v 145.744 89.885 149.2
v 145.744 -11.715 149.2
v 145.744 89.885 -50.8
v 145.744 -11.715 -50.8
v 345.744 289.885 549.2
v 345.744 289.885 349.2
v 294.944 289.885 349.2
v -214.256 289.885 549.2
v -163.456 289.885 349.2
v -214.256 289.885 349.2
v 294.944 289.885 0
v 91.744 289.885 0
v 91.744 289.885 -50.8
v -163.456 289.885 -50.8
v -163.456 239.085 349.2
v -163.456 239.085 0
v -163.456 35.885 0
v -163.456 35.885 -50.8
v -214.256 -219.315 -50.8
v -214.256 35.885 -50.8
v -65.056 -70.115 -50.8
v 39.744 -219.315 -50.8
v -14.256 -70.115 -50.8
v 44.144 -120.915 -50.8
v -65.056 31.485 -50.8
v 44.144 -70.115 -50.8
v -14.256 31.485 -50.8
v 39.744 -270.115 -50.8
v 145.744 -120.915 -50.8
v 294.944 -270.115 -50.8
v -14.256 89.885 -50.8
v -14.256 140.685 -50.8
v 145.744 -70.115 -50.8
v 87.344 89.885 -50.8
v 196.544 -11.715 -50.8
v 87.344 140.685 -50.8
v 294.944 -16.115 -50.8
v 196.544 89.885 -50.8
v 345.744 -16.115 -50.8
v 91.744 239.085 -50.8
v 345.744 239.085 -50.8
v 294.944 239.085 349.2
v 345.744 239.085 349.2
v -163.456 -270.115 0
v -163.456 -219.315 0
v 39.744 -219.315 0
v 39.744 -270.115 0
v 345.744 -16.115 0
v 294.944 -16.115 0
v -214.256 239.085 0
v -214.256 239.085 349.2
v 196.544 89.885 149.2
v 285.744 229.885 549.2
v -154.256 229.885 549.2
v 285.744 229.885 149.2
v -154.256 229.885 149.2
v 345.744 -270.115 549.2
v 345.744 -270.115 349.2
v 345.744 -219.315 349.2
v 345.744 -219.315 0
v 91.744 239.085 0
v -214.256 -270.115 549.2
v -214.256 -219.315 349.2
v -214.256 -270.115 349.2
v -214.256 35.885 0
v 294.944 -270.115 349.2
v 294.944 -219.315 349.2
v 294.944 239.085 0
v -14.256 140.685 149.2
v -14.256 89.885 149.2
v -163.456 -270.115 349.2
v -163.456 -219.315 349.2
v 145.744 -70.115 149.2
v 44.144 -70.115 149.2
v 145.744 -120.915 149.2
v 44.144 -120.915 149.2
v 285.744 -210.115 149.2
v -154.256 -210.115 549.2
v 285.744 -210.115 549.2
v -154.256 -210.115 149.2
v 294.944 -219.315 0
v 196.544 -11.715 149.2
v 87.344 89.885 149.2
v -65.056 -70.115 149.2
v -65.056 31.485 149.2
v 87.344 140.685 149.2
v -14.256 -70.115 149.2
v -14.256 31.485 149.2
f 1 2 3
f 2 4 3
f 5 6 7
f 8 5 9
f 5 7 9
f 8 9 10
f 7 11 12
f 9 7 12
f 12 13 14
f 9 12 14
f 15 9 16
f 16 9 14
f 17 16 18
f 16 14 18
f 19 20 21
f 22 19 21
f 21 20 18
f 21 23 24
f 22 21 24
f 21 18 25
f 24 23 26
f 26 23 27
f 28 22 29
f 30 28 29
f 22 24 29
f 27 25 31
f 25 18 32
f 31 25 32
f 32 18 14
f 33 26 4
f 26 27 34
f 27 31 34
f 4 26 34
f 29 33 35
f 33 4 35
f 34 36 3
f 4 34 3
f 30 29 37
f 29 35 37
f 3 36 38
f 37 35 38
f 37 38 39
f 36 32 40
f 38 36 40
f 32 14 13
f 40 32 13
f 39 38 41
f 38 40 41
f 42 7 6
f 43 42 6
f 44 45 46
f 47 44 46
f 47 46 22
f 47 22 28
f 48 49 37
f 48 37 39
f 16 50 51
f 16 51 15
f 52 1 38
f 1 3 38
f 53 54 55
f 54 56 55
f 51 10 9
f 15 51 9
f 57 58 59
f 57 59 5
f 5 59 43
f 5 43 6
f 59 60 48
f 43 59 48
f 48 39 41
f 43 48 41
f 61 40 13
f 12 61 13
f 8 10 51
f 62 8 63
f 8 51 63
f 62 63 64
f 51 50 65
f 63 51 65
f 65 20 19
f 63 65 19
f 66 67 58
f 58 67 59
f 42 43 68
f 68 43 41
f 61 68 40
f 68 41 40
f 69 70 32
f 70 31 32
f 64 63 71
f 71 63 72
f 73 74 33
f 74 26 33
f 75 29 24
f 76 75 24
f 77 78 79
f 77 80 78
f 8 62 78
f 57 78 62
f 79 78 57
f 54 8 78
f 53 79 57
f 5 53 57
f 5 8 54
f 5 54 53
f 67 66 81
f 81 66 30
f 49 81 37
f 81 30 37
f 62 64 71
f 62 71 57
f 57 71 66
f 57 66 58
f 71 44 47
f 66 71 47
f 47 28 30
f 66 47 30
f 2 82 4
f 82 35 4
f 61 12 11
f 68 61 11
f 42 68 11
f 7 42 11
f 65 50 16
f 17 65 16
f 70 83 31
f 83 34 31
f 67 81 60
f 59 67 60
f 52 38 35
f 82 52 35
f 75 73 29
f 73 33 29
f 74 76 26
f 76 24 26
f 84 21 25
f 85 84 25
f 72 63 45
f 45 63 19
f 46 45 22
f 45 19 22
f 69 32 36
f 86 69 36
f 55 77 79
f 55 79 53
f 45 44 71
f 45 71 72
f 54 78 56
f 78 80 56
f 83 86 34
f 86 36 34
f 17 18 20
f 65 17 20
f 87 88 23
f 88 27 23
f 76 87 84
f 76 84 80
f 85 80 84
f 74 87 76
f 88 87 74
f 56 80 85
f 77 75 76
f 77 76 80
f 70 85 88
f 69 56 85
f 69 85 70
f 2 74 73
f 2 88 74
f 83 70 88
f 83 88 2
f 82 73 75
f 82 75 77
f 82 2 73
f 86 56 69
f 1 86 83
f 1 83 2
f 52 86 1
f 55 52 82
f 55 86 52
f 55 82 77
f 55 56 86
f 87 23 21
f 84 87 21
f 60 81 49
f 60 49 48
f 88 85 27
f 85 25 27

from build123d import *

# Parameters (mm, degrees)
F0_W     = 440
F0_H     = 440
F1_DEPTH = 50.8
F0_W_2   = 50.8
F0_H_2   = 203.2
F0_W_3   = 203.2
F0_H_3   = 50.8
F2_DEPTH = 349.2
F3_DEPTH = 149.2
F4_W     = 440
F4_H     = 440
F4_W_2   = 50.8
F4_H_2   = 50.8
F5_DEPTH = 200


# Not quite as in the source:
# - a feature names something its author has since deleted; it is built from what else it names


with BuildPart() as f1:
    # F0 (on Top) → F1 (new body)
    with BuildSketch(Plane.XY):
        Polygon((91.7435496044, 289.8852448295), (-163.4564503956, 289.8852448295), (-163.4564503956, 239.0852448295), (-163.4564503956, 35.8852448295), (-214.2564503956, 35.8852448295), (-214.2564503956, -219.3147551705), (-163.4564503956, -219.3147551705), (39.7435496044, -219.3147551705), (39.7435496044, -270.1147551705), (294.9435496044, -270.1147551705), (294.9435496044, -219.3147551705), (294.9435496044, -16.1147551705), (345.7435496044, -16.1147551705), (345.7435496044, 239.0852448295), (294.9435496044, 239.0852448295), (91.7435496044, 239.0852448295), align=None)
        with Locations((65.7435496044, 9.8852448295)):
            Rectangle(F0_W, F0_H, mode=Mode.SUBTRACT)
        with Locations((65.7435496044, 9.8852448295)):
            Rectangle(F0_W, F0_H)
        Polygon((-65.0564503956, 140.6852448295), (-14.2564503956, 140.6852448295), (87.3435496044, 140.6852448295), (196.5435496044, 140.6852448295), (196.5435496044, 89.8852448295), (196.5435496044, -11.7147551705), (196.5435496044, -120.9147551705), (145.7435496044, -120.9147551705), (44.1435496044, -120.9147551705), (-65.0564503956, -120.9147551705), (-65.0564503956, -70.1147551705), (-65.0564503956, 31.4852448295), align=None, mode=Mode.SUBTRACT)
        Polygon((87.3435496044, 89.8852448295), (-14.2564503956, 89.8852448295), (-14.2564503956, 140.6852448295), (-65.0564503956, 140.6852448295), (-65.0564503956, 31.4852448295), (-14.2564503956, 31.4852448295), (-14.2564503956, -70.1147551705), (-65.0564503956, -70.1147551705), (-65.0564503956, -120.9147551705), (44.1435496044, -120.9147551705), (44.1435496044, -70.1147551705), (145.7435496044, -70.1147551705), (145.7435496044, -120.9147551705), (196.5435496044, -120.9147551705), (196.5435496044, -11.7147551705), (145.7435496044, -11.7147551705), (145.7435496044, 89.8852448295), (196.5435496044, 89.8852448295), (196.5435496044, 140.6852448295), (87.3435496044, 140.6852448295), align=None)
    extrude(amount=-F1_DEPTH)

    # F0 (on Top) → F2 (join)
    with BuildSketch(Plane.XY):
        Polygon((91.7435496044, 289.8852448295), (-163.4564503956, 289.8852448295), (-163.4564503956, 239.0852448295), (-163.4564503956, 35.8852448295), (-214.2564503956, 35.8852448295), (-214.2564503956, -219.3147551705), (-163.4564503956, -219.3147551705), (39.7435496044, -219.3147551705), (39.7435496044, -270.1147551705), (294.9435496044, -270.1147551705), (294.9435496044, -219.3147551705), (294.9435496044, -16.1147551705), (345.7435496044, -16.1147551705), (345.7435496044, 239.0852448295), (294.9435496044, 239.0852448295), (91.7435496044, 239.0852448295), align=None)
        with Locations((65.7435496044, 9.8852448295)):
            Rectangle(F0_W, F0_H, mode=Mode.SUBTRACT)
        with Locations((320.3435496044, -117.7147551705)):
            Rectangle(F0_W_2, F0_H_2)
        with Locations((193.3435496044, 264.4852448295)):
            Rectangle(F0_W_3, F0_H_3)
        with Locations((-188.8564503956, 137.4852448295)):
            Rectangle(F0_W_2, F0_H_2)
        with Locations((-61.8564503956, -244.7147551705)):
            Rectangle(F0_W_3, F0_H_3)
    extrude(amount=F2_DEPTH)

    # F0 (on Top) → F3 (join)
    with BuildSketch(Plane.XY):
        with Locations((65.7435496044, 9.8852448295)):
            Rectangle(F0_W, F0_H)
        Polygon((-65.0564503956, 140.6852448295), (-14.2564503956, 140.6852448295), (87.3435496044, 140.6852448295), (196.5435496044, 140.6852448295), (196.5435496044, 89.8852448295), (196.5435496044, -11.7147551705), (196.5435496044, -120.9147551705), (145.7435496044, -120.9147551705), (44.1435496044, -120.9147551705), (-65.0564503956, -120.9147551705), (-65.0564503956, -70.1147551705), (-65.0564503956, 31.4852448295), align=None, mode=Mode.SUBTRACT)
        Polygon((87.3435496044, 89.8852448295), (-14.2564503956, 89.8852448295), (-14.2564503956, 140.6852448295), (-65.0564503956, 140.6852448295), (-65.0564503956, 31.4852448295), (-14.2564503956, 31.4852448295), (-14.2564503956, -70.1147551705), (-65.0564503956, -70.1147551705), (-65.0564503956, -120.9147551705), (44.1435496044, -120.9147551705), (44.1435496044, -70.1147551705), (145.7435496044, -70.1147551705), (145.7435496044, -120.9147551705), (196.5435496044, -120.9147551705), (196.5435496044, -11.7147551705), (145.7435496044, -11.7147551705), (145.7435496044, 89.8852448295), (196.5435496044, 89.8852448295), (196.5435496044, 140.6852448295), (87.3435496044, 140.6852448295), align=None)
    extrude(amount=F3_DEPTH)

    # F4 (on face) → F5 (join)
    with BuildSketch(Plane.XY.offset(349.2)):
        Polygon((-163.4564503956, -219.3147551705), (-163.4564503956, -270.1147551705), (294.9435496044, -270.1147551705), (294.9435496044, -219.3147551705), (345.7435496044, -219.3147551705), (345.7435496044, 239.0852448295), (294.9435496044, 239.0852448295), (294.9435496044, 289.8852448295), (-163.4564503956, 289.8852448295), (-163.4564503956, 239.0852448295), (-214.2564503956, 239.0852448295), (-214.2564503956, -219.3147551705), align=None)
        with Locations((65.7435496044, 9.8852448295)):
            Rectangle(F4_W, F4_H, mode=Mode.SUBTRACT)
        with Locations((-188.8564503956, -244.7147551705)):
            Rectangle(F4_W_2, F4_H_2)
        with Locations((320.3435496044, 264.4852448295)):
            Rectangle(F4_W_2, F4_H_2)
        with Locations((-188.8564503956, 264.4852448295)):
            Rectangle(F4_W_2, F4_H_2)
        with Locations((320.3435496044, -244.7147551705)):
            Rectangle(F4_W_2, F4_H_2)
    extrude(amount=F5_DEPTH)


solid = f1.part
